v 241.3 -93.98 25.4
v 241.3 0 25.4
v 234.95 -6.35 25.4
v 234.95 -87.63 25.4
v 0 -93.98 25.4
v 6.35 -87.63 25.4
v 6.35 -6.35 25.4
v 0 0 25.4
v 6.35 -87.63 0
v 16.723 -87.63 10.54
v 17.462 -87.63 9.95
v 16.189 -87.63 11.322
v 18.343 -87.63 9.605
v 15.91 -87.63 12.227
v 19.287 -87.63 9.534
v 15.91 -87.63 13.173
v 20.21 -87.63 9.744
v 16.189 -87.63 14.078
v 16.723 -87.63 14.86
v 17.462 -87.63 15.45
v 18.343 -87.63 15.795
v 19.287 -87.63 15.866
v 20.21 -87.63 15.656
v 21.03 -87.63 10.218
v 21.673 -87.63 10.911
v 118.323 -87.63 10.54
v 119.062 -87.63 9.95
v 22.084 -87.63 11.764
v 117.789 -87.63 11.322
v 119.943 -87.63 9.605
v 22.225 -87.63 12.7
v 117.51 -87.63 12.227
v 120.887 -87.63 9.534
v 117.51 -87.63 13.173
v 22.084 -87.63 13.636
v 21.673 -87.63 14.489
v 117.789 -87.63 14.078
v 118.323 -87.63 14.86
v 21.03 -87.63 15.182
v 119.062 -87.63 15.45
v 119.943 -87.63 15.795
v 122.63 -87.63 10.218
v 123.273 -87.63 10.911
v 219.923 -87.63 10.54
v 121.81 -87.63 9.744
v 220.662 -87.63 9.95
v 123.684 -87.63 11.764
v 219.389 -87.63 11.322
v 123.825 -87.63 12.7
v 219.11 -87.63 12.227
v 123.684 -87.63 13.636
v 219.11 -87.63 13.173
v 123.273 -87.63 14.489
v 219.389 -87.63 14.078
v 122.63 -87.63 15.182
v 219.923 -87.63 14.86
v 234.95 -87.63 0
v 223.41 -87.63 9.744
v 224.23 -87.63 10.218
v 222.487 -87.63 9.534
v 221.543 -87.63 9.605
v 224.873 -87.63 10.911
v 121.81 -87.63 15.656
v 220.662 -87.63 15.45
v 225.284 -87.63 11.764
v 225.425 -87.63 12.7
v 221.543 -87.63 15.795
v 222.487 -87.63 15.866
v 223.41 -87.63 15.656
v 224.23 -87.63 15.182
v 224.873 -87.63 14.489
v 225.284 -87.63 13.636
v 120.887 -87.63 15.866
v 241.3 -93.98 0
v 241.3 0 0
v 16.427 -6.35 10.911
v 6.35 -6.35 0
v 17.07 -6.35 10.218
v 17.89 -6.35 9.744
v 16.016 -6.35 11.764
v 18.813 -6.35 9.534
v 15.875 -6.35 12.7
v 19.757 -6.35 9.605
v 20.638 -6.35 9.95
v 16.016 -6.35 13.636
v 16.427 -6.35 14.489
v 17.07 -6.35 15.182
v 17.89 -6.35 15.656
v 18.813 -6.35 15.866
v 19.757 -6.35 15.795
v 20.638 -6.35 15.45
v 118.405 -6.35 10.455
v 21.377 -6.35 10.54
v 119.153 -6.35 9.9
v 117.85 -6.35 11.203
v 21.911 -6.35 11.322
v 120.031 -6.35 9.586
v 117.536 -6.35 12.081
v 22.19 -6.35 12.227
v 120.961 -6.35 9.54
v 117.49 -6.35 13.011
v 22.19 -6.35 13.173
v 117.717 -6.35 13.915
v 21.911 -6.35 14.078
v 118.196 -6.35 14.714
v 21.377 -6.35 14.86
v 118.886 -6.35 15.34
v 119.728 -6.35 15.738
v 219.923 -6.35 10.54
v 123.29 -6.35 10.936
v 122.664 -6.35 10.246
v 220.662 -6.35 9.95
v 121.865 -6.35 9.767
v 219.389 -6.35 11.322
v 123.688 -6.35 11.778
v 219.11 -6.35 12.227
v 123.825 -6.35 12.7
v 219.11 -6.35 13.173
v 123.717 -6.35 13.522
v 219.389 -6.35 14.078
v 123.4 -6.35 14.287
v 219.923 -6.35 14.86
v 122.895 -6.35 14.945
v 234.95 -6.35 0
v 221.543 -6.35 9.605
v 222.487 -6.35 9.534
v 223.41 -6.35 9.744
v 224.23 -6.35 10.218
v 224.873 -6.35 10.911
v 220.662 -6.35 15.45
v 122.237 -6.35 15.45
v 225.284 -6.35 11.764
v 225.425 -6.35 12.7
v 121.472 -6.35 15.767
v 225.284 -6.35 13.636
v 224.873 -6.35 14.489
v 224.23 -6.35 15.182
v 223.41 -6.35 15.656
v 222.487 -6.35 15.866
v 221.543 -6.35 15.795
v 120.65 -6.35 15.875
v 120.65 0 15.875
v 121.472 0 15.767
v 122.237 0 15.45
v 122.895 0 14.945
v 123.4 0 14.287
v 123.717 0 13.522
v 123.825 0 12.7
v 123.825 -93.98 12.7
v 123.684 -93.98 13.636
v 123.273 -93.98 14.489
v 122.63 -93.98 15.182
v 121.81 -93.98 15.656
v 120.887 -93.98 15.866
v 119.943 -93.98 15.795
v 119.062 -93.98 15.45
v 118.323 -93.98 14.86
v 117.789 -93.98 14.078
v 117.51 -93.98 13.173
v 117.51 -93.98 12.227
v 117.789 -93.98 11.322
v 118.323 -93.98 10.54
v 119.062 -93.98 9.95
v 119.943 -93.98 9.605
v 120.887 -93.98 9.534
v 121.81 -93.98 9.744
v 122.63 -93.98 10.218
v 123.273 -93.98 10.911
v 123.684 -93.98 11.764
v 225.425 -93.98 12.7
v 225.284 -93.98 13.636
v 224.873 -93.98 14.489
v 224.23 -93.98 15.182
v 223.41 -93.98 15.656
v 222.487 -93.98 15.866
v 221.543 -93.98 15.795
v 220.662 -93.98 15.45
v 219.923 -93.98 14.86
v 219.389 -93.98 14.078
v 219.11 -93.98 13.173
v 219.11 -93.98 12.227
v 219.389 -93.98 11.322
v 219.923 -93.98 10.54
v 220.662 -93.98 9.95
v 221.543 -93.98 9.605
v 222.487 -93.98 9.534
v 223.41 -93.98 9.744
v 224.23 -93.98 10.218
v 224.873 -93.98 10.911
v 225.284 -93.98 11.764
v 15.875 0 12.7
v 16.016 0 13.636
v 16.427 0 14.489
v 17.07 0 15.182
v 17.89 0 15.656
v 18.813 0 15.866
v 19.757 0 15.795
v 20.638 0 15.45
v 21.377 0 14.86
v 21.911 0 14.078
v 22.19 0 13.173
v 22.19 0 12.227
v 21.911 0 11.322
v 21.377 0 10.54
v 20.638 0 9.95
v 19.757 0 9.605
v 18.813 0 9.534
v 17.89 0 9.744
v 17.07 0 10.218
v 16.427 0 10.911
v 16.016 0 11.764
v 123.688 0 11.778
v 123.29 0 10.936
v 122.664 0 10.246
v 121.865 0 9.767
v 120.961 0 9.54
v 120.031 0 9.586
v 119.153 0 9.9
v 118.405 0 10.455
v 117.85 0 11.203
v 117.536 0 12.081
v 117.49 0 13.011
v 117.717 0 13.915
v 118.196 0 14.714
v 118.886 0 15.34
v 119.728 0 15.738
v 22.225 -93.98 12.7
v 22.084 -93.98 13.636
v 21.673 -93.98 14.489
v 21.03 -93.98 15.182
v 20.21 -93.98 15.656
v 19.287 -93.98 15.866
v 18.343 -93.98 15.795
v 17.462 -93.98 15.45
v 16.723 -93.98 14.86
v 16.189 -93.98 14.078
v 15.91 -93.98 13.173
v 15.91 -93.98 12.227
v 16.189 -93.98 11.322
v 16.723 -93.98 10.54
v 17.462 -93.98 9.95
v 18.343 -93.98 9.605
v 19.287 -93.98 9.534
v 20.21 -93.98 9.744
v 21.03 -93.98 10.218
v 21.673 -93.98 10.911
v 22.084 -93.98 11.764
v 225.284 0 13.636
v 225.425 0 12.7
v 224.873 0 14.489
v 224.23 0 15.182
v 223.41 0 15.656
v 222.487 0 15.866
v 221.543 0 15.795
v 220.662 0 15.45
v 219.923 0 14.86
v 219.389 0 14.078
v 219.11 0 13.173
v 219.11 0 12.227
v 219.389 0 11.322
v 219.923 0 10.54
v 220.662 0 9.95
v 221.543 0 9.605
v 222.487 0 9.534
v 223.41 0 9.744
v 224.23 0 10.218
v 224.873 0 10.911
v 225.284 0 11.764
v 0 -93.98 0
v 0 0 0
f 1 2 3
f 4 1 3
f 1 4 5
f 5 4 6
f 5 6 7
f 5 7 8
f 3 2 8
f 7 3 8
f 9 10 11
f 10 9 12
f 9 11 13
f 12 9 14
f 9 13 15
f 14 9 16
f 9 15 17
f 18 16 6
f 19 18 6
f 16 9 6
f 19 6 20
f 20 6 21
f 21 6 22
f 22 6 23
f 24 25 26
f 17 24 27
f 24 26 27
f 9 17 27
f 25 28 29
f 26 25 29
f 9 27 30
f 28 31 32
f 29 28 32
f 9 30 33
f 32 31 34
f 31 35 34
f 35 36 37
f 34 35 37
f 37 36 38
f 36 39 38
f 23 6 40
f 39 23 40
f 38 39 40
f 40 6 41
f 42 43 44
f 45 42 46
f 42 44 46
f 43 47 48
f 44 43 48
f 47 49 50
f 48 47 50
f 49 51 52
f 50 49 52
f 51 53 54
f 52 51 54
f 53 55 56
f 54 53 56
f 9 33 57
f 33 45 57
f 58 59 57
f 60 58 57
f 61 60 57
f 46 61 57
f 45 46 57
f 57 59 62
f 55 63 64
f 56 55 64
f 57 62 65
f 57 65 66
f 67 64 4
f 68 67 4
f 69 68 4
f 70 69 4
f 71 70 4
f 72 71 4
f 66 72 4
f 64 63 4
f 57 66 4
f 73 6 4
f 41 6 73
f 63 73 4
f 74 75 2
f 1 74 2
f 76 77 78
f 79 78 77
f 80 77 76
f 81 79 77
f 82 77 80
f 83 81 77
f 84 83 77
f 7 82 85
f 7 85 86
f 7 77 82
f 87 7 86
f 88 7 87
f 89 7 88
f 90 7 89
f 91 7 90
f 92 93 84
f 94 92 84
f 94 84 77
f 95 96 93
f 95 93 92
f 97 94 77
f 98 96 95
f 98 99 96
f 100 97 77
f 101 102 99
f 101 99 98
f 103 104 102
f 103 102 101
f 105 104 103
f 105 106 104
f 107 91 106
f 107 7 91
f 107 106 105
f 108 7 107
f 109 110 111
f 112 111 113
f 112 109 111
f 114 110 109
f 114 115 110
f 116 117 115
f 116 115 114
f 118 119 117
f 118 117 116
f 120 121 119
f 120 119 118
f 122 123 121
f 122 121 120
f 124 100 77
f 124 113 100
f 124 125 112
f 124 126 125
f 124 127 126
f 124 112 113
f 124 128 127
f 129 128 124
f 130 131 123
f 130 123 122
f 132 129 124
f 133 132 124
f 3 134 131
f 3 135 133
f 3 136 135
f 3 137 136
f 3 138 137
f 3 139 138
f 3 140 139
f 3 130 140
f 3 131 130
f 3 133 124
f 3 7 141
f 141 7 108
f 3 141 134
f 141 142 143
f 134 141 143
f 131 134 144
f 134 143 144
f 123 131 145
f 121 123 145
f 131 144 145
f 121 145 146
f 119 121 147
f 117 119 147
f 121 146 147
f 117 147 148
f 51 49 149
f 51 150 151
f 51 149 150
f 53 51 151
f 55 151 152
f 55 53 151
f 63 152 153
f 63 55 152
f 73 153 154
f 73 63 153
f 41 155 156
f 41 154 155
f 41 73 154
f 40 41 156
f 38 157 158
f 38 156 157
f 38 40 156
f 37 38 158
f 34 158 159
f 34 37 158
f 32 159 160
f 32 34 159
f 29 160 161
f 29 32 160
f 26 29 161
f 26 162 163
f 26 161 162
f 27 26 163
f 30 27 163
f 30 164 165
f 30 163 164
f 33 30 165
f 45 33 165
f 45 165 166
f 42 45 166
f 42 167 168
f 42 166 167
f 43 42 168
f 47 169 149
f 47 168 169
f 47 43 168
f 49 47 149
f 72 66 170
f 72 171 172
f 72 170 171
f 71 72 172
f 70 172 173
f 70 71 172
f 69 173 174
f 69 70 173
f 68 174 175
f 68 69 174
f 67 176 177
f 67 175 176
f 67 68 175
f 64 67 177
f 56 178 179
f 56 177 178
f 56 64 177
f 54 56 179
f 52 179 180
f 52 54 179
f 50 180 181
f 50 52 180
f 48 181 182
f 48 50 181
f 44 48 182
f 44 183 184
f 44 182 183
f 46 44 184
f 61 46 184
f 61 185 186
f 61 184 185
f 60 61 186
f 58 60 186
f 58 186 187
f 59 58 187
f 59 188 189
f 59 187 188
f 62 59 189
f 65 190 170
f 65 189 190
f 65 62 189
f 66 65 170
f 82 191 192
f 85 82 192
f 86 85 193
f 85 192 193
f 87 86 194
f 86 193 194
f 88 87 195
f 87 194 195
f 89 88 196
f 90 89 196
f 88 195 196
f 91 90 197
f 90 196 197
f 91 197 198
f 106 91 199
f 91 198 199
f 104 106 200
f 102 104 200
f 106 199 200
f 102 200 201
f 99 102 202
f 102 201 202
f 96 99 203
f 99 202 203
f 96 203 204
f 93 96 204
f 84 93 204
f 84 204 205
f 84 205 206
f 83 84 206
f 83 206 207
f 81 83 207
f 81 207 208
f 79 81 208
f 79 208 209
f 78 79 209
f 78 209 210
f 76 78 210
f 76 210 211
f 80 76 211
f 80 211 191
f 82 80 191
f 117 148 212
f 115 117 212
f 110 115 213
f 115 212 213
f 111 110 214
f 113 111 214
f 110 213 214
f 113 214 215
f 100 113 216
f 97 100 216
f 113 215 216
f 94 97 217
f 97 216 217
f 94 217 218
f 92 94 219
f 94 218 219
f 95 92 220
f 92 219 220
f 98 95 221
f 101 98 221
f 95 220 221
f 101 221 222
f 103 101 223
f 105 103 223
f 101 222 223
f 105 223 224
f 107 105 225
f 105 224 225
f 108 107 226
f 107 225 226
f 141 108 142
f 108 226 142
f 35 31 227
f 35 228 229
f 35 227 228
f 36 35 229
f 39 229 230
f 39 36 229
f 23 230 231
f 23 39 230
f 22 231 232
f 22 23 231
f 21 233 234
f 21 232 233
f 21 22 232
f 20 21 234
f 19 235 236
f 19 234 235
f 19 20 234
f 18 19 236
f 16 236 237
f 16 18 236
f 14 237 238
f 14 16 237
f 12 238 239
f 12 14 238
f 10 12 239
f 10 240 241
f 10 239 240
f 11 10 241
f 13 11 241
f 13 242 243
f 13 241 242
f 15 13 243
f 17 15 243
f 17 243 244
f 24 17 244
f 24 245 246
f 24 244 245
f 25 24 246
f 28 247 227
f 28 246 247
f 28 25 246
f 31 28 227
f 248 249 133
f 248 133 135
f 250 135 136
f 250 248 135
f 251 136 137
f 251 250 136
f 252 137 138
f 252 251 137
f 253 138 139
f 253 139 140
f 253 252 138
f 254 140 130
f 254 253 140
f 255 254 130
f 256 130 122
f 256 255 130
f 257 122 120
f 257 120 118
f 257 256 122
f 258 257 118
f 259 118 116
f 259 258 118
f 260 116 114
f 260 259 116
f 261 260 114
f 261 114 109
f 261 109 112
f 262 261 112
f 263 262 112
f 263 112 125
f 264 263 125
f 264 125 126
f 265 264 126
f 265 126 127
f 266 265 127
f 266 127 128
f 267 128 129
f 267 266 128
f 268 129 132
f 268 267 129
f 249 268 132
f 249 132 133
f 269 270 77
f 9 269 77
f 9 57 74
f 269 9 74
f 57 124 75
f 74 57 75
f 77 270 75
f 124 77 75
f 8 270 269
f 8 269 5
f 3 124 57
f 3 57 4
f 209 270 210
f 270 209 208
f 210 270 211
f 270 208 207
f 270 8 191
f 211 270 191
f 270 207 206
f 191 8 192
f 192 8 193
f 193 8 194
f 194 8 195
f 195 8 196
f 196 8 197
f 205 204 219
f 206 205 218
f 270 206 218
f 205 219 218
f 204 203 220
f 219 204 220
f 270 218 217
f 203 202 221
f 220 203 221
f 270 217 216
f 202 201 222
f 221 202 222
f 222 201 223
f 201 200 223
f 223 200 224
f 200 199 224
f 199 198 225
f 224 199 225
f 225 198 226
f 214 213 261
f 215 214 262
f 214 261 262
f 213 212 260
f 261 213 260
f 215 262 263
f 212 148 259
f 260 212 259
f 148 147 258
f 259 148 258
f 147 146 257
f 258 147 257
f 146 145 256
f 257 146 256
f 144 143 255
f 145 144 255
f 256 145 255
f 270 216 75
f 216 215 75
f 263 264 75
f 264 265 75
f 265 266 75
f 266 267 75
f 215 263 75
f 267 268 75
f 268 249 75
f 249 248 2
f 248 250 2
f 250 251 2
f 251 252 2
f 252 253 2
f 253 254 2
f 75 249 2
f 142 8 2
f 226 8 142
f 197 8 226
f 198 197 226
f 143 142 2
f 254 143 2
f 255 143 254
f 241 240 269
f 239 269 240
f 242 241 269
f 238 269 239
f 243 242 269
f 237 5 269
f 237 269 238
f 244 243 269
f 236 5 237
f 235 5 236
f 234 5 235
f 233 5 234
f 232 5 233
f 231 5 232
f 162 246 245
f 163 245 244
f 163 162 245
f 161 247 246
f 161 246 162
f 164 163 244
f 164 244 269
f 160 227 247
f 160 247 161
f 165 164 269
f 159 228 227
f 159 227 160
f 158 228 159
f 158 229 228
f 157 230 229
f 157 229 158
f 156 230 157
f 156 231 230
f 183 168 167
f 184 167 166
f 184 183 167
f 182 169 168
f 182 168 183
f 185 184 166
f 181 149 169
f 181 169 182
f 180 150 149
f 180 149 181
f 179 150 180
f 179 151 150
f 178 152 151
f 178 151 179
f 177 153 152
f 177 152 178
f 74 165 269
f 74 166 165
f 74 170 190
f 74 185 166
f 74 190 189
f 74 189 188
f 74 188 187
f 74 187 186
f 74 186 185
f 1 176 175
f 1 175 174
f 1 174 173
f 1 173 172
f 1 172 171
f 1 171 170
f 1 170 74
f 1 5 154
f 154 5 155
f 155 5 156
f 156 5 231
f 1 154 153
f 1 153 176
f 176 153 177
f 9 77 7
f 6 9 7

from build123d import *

# Parameters (mm, degrees)
F0_R     = 3.175
F1_DEPTH = 6.35
F2_W     = 6.35
F2_H     = 25.4
F3_DEPTH = 81.28
F4_W     = 234.95
F4_H     = 25.4
F4_W_2   = 6.35
F5_DEPTH = 6.35
F6_R     = 3.175
F7_DEPTH = 508


with BuildPart() as f1:
    # F0 (on Front) → F1 (new body)
    with BuildSketch(Plane.XZ):
        Polygon((0, 12.7), (0, 0), (241.3, 0), (241.3, 12.7), (241.3, 25.4), (120.65, 25.4), (0, 25.4), align=None)
        with BuildLine():
            ThreePointArc((22.225, 12.7), (19.05, 9.525), (15.875, 12.7))
            ThreePointArc((15.875, 12.7), (19.05, 15.875), (22.225, 12.7))
        make_face(mode=Mode.SUBTRACT)
        with BuildLine():
            ThreePointArc((123.825, 12.7), (118.404936, 10.454936), (120.65, 15.875))
            ThreePointArc((120.65, 15.875), (122.895064, 14.945064), (123.825, 12.7))
        make_face(mode=Mode.SUBTRACT)
        with Locations((222.25, 12.7)):
            Circle(F0_R, mode=Mode.SUBTRACT)
    extrude(amount=F1_DEPTH)

    # F2 (on face) → F3 (join)
    with BuildSketch(Plane.XZ.offset(6.35)):
        with Locations((3.175, 12.7)):
            Rectangle(F2_W, F2_H)
        with Locations((238.125, 12.7)):
            Rectangle(F2_W, F2_H)
    extrude(amount=F3_DEPTH)

    # F4 (on face) → F5 (join)
    with BuildSketch(Plane.XZ.offset(87.63)):
        with Locations((123.825, 12.7)):
            Rectangle(F4_W, F4_H)
        with Locations((3.175, 12.7)):
            Rectangle(F4_W_2, F4_H)
    extrude(amount=F5_DEPTH)

    # F6 (on face) → F7 (cut)
    with BuildSketch(Plane.XZ.offset(6.35)):
        with Locations((222.25, 12.7)):
            Circle(F6_R)
        with Locations((120.65, 12.7)):
            Circle(F6_R)
        with Locations((19.05, 12.7)):
            Circle(F6_R)
    extrude(amount=F7_DEPTH, mode=Mode.SUBTRACT)


solid = f1.part
